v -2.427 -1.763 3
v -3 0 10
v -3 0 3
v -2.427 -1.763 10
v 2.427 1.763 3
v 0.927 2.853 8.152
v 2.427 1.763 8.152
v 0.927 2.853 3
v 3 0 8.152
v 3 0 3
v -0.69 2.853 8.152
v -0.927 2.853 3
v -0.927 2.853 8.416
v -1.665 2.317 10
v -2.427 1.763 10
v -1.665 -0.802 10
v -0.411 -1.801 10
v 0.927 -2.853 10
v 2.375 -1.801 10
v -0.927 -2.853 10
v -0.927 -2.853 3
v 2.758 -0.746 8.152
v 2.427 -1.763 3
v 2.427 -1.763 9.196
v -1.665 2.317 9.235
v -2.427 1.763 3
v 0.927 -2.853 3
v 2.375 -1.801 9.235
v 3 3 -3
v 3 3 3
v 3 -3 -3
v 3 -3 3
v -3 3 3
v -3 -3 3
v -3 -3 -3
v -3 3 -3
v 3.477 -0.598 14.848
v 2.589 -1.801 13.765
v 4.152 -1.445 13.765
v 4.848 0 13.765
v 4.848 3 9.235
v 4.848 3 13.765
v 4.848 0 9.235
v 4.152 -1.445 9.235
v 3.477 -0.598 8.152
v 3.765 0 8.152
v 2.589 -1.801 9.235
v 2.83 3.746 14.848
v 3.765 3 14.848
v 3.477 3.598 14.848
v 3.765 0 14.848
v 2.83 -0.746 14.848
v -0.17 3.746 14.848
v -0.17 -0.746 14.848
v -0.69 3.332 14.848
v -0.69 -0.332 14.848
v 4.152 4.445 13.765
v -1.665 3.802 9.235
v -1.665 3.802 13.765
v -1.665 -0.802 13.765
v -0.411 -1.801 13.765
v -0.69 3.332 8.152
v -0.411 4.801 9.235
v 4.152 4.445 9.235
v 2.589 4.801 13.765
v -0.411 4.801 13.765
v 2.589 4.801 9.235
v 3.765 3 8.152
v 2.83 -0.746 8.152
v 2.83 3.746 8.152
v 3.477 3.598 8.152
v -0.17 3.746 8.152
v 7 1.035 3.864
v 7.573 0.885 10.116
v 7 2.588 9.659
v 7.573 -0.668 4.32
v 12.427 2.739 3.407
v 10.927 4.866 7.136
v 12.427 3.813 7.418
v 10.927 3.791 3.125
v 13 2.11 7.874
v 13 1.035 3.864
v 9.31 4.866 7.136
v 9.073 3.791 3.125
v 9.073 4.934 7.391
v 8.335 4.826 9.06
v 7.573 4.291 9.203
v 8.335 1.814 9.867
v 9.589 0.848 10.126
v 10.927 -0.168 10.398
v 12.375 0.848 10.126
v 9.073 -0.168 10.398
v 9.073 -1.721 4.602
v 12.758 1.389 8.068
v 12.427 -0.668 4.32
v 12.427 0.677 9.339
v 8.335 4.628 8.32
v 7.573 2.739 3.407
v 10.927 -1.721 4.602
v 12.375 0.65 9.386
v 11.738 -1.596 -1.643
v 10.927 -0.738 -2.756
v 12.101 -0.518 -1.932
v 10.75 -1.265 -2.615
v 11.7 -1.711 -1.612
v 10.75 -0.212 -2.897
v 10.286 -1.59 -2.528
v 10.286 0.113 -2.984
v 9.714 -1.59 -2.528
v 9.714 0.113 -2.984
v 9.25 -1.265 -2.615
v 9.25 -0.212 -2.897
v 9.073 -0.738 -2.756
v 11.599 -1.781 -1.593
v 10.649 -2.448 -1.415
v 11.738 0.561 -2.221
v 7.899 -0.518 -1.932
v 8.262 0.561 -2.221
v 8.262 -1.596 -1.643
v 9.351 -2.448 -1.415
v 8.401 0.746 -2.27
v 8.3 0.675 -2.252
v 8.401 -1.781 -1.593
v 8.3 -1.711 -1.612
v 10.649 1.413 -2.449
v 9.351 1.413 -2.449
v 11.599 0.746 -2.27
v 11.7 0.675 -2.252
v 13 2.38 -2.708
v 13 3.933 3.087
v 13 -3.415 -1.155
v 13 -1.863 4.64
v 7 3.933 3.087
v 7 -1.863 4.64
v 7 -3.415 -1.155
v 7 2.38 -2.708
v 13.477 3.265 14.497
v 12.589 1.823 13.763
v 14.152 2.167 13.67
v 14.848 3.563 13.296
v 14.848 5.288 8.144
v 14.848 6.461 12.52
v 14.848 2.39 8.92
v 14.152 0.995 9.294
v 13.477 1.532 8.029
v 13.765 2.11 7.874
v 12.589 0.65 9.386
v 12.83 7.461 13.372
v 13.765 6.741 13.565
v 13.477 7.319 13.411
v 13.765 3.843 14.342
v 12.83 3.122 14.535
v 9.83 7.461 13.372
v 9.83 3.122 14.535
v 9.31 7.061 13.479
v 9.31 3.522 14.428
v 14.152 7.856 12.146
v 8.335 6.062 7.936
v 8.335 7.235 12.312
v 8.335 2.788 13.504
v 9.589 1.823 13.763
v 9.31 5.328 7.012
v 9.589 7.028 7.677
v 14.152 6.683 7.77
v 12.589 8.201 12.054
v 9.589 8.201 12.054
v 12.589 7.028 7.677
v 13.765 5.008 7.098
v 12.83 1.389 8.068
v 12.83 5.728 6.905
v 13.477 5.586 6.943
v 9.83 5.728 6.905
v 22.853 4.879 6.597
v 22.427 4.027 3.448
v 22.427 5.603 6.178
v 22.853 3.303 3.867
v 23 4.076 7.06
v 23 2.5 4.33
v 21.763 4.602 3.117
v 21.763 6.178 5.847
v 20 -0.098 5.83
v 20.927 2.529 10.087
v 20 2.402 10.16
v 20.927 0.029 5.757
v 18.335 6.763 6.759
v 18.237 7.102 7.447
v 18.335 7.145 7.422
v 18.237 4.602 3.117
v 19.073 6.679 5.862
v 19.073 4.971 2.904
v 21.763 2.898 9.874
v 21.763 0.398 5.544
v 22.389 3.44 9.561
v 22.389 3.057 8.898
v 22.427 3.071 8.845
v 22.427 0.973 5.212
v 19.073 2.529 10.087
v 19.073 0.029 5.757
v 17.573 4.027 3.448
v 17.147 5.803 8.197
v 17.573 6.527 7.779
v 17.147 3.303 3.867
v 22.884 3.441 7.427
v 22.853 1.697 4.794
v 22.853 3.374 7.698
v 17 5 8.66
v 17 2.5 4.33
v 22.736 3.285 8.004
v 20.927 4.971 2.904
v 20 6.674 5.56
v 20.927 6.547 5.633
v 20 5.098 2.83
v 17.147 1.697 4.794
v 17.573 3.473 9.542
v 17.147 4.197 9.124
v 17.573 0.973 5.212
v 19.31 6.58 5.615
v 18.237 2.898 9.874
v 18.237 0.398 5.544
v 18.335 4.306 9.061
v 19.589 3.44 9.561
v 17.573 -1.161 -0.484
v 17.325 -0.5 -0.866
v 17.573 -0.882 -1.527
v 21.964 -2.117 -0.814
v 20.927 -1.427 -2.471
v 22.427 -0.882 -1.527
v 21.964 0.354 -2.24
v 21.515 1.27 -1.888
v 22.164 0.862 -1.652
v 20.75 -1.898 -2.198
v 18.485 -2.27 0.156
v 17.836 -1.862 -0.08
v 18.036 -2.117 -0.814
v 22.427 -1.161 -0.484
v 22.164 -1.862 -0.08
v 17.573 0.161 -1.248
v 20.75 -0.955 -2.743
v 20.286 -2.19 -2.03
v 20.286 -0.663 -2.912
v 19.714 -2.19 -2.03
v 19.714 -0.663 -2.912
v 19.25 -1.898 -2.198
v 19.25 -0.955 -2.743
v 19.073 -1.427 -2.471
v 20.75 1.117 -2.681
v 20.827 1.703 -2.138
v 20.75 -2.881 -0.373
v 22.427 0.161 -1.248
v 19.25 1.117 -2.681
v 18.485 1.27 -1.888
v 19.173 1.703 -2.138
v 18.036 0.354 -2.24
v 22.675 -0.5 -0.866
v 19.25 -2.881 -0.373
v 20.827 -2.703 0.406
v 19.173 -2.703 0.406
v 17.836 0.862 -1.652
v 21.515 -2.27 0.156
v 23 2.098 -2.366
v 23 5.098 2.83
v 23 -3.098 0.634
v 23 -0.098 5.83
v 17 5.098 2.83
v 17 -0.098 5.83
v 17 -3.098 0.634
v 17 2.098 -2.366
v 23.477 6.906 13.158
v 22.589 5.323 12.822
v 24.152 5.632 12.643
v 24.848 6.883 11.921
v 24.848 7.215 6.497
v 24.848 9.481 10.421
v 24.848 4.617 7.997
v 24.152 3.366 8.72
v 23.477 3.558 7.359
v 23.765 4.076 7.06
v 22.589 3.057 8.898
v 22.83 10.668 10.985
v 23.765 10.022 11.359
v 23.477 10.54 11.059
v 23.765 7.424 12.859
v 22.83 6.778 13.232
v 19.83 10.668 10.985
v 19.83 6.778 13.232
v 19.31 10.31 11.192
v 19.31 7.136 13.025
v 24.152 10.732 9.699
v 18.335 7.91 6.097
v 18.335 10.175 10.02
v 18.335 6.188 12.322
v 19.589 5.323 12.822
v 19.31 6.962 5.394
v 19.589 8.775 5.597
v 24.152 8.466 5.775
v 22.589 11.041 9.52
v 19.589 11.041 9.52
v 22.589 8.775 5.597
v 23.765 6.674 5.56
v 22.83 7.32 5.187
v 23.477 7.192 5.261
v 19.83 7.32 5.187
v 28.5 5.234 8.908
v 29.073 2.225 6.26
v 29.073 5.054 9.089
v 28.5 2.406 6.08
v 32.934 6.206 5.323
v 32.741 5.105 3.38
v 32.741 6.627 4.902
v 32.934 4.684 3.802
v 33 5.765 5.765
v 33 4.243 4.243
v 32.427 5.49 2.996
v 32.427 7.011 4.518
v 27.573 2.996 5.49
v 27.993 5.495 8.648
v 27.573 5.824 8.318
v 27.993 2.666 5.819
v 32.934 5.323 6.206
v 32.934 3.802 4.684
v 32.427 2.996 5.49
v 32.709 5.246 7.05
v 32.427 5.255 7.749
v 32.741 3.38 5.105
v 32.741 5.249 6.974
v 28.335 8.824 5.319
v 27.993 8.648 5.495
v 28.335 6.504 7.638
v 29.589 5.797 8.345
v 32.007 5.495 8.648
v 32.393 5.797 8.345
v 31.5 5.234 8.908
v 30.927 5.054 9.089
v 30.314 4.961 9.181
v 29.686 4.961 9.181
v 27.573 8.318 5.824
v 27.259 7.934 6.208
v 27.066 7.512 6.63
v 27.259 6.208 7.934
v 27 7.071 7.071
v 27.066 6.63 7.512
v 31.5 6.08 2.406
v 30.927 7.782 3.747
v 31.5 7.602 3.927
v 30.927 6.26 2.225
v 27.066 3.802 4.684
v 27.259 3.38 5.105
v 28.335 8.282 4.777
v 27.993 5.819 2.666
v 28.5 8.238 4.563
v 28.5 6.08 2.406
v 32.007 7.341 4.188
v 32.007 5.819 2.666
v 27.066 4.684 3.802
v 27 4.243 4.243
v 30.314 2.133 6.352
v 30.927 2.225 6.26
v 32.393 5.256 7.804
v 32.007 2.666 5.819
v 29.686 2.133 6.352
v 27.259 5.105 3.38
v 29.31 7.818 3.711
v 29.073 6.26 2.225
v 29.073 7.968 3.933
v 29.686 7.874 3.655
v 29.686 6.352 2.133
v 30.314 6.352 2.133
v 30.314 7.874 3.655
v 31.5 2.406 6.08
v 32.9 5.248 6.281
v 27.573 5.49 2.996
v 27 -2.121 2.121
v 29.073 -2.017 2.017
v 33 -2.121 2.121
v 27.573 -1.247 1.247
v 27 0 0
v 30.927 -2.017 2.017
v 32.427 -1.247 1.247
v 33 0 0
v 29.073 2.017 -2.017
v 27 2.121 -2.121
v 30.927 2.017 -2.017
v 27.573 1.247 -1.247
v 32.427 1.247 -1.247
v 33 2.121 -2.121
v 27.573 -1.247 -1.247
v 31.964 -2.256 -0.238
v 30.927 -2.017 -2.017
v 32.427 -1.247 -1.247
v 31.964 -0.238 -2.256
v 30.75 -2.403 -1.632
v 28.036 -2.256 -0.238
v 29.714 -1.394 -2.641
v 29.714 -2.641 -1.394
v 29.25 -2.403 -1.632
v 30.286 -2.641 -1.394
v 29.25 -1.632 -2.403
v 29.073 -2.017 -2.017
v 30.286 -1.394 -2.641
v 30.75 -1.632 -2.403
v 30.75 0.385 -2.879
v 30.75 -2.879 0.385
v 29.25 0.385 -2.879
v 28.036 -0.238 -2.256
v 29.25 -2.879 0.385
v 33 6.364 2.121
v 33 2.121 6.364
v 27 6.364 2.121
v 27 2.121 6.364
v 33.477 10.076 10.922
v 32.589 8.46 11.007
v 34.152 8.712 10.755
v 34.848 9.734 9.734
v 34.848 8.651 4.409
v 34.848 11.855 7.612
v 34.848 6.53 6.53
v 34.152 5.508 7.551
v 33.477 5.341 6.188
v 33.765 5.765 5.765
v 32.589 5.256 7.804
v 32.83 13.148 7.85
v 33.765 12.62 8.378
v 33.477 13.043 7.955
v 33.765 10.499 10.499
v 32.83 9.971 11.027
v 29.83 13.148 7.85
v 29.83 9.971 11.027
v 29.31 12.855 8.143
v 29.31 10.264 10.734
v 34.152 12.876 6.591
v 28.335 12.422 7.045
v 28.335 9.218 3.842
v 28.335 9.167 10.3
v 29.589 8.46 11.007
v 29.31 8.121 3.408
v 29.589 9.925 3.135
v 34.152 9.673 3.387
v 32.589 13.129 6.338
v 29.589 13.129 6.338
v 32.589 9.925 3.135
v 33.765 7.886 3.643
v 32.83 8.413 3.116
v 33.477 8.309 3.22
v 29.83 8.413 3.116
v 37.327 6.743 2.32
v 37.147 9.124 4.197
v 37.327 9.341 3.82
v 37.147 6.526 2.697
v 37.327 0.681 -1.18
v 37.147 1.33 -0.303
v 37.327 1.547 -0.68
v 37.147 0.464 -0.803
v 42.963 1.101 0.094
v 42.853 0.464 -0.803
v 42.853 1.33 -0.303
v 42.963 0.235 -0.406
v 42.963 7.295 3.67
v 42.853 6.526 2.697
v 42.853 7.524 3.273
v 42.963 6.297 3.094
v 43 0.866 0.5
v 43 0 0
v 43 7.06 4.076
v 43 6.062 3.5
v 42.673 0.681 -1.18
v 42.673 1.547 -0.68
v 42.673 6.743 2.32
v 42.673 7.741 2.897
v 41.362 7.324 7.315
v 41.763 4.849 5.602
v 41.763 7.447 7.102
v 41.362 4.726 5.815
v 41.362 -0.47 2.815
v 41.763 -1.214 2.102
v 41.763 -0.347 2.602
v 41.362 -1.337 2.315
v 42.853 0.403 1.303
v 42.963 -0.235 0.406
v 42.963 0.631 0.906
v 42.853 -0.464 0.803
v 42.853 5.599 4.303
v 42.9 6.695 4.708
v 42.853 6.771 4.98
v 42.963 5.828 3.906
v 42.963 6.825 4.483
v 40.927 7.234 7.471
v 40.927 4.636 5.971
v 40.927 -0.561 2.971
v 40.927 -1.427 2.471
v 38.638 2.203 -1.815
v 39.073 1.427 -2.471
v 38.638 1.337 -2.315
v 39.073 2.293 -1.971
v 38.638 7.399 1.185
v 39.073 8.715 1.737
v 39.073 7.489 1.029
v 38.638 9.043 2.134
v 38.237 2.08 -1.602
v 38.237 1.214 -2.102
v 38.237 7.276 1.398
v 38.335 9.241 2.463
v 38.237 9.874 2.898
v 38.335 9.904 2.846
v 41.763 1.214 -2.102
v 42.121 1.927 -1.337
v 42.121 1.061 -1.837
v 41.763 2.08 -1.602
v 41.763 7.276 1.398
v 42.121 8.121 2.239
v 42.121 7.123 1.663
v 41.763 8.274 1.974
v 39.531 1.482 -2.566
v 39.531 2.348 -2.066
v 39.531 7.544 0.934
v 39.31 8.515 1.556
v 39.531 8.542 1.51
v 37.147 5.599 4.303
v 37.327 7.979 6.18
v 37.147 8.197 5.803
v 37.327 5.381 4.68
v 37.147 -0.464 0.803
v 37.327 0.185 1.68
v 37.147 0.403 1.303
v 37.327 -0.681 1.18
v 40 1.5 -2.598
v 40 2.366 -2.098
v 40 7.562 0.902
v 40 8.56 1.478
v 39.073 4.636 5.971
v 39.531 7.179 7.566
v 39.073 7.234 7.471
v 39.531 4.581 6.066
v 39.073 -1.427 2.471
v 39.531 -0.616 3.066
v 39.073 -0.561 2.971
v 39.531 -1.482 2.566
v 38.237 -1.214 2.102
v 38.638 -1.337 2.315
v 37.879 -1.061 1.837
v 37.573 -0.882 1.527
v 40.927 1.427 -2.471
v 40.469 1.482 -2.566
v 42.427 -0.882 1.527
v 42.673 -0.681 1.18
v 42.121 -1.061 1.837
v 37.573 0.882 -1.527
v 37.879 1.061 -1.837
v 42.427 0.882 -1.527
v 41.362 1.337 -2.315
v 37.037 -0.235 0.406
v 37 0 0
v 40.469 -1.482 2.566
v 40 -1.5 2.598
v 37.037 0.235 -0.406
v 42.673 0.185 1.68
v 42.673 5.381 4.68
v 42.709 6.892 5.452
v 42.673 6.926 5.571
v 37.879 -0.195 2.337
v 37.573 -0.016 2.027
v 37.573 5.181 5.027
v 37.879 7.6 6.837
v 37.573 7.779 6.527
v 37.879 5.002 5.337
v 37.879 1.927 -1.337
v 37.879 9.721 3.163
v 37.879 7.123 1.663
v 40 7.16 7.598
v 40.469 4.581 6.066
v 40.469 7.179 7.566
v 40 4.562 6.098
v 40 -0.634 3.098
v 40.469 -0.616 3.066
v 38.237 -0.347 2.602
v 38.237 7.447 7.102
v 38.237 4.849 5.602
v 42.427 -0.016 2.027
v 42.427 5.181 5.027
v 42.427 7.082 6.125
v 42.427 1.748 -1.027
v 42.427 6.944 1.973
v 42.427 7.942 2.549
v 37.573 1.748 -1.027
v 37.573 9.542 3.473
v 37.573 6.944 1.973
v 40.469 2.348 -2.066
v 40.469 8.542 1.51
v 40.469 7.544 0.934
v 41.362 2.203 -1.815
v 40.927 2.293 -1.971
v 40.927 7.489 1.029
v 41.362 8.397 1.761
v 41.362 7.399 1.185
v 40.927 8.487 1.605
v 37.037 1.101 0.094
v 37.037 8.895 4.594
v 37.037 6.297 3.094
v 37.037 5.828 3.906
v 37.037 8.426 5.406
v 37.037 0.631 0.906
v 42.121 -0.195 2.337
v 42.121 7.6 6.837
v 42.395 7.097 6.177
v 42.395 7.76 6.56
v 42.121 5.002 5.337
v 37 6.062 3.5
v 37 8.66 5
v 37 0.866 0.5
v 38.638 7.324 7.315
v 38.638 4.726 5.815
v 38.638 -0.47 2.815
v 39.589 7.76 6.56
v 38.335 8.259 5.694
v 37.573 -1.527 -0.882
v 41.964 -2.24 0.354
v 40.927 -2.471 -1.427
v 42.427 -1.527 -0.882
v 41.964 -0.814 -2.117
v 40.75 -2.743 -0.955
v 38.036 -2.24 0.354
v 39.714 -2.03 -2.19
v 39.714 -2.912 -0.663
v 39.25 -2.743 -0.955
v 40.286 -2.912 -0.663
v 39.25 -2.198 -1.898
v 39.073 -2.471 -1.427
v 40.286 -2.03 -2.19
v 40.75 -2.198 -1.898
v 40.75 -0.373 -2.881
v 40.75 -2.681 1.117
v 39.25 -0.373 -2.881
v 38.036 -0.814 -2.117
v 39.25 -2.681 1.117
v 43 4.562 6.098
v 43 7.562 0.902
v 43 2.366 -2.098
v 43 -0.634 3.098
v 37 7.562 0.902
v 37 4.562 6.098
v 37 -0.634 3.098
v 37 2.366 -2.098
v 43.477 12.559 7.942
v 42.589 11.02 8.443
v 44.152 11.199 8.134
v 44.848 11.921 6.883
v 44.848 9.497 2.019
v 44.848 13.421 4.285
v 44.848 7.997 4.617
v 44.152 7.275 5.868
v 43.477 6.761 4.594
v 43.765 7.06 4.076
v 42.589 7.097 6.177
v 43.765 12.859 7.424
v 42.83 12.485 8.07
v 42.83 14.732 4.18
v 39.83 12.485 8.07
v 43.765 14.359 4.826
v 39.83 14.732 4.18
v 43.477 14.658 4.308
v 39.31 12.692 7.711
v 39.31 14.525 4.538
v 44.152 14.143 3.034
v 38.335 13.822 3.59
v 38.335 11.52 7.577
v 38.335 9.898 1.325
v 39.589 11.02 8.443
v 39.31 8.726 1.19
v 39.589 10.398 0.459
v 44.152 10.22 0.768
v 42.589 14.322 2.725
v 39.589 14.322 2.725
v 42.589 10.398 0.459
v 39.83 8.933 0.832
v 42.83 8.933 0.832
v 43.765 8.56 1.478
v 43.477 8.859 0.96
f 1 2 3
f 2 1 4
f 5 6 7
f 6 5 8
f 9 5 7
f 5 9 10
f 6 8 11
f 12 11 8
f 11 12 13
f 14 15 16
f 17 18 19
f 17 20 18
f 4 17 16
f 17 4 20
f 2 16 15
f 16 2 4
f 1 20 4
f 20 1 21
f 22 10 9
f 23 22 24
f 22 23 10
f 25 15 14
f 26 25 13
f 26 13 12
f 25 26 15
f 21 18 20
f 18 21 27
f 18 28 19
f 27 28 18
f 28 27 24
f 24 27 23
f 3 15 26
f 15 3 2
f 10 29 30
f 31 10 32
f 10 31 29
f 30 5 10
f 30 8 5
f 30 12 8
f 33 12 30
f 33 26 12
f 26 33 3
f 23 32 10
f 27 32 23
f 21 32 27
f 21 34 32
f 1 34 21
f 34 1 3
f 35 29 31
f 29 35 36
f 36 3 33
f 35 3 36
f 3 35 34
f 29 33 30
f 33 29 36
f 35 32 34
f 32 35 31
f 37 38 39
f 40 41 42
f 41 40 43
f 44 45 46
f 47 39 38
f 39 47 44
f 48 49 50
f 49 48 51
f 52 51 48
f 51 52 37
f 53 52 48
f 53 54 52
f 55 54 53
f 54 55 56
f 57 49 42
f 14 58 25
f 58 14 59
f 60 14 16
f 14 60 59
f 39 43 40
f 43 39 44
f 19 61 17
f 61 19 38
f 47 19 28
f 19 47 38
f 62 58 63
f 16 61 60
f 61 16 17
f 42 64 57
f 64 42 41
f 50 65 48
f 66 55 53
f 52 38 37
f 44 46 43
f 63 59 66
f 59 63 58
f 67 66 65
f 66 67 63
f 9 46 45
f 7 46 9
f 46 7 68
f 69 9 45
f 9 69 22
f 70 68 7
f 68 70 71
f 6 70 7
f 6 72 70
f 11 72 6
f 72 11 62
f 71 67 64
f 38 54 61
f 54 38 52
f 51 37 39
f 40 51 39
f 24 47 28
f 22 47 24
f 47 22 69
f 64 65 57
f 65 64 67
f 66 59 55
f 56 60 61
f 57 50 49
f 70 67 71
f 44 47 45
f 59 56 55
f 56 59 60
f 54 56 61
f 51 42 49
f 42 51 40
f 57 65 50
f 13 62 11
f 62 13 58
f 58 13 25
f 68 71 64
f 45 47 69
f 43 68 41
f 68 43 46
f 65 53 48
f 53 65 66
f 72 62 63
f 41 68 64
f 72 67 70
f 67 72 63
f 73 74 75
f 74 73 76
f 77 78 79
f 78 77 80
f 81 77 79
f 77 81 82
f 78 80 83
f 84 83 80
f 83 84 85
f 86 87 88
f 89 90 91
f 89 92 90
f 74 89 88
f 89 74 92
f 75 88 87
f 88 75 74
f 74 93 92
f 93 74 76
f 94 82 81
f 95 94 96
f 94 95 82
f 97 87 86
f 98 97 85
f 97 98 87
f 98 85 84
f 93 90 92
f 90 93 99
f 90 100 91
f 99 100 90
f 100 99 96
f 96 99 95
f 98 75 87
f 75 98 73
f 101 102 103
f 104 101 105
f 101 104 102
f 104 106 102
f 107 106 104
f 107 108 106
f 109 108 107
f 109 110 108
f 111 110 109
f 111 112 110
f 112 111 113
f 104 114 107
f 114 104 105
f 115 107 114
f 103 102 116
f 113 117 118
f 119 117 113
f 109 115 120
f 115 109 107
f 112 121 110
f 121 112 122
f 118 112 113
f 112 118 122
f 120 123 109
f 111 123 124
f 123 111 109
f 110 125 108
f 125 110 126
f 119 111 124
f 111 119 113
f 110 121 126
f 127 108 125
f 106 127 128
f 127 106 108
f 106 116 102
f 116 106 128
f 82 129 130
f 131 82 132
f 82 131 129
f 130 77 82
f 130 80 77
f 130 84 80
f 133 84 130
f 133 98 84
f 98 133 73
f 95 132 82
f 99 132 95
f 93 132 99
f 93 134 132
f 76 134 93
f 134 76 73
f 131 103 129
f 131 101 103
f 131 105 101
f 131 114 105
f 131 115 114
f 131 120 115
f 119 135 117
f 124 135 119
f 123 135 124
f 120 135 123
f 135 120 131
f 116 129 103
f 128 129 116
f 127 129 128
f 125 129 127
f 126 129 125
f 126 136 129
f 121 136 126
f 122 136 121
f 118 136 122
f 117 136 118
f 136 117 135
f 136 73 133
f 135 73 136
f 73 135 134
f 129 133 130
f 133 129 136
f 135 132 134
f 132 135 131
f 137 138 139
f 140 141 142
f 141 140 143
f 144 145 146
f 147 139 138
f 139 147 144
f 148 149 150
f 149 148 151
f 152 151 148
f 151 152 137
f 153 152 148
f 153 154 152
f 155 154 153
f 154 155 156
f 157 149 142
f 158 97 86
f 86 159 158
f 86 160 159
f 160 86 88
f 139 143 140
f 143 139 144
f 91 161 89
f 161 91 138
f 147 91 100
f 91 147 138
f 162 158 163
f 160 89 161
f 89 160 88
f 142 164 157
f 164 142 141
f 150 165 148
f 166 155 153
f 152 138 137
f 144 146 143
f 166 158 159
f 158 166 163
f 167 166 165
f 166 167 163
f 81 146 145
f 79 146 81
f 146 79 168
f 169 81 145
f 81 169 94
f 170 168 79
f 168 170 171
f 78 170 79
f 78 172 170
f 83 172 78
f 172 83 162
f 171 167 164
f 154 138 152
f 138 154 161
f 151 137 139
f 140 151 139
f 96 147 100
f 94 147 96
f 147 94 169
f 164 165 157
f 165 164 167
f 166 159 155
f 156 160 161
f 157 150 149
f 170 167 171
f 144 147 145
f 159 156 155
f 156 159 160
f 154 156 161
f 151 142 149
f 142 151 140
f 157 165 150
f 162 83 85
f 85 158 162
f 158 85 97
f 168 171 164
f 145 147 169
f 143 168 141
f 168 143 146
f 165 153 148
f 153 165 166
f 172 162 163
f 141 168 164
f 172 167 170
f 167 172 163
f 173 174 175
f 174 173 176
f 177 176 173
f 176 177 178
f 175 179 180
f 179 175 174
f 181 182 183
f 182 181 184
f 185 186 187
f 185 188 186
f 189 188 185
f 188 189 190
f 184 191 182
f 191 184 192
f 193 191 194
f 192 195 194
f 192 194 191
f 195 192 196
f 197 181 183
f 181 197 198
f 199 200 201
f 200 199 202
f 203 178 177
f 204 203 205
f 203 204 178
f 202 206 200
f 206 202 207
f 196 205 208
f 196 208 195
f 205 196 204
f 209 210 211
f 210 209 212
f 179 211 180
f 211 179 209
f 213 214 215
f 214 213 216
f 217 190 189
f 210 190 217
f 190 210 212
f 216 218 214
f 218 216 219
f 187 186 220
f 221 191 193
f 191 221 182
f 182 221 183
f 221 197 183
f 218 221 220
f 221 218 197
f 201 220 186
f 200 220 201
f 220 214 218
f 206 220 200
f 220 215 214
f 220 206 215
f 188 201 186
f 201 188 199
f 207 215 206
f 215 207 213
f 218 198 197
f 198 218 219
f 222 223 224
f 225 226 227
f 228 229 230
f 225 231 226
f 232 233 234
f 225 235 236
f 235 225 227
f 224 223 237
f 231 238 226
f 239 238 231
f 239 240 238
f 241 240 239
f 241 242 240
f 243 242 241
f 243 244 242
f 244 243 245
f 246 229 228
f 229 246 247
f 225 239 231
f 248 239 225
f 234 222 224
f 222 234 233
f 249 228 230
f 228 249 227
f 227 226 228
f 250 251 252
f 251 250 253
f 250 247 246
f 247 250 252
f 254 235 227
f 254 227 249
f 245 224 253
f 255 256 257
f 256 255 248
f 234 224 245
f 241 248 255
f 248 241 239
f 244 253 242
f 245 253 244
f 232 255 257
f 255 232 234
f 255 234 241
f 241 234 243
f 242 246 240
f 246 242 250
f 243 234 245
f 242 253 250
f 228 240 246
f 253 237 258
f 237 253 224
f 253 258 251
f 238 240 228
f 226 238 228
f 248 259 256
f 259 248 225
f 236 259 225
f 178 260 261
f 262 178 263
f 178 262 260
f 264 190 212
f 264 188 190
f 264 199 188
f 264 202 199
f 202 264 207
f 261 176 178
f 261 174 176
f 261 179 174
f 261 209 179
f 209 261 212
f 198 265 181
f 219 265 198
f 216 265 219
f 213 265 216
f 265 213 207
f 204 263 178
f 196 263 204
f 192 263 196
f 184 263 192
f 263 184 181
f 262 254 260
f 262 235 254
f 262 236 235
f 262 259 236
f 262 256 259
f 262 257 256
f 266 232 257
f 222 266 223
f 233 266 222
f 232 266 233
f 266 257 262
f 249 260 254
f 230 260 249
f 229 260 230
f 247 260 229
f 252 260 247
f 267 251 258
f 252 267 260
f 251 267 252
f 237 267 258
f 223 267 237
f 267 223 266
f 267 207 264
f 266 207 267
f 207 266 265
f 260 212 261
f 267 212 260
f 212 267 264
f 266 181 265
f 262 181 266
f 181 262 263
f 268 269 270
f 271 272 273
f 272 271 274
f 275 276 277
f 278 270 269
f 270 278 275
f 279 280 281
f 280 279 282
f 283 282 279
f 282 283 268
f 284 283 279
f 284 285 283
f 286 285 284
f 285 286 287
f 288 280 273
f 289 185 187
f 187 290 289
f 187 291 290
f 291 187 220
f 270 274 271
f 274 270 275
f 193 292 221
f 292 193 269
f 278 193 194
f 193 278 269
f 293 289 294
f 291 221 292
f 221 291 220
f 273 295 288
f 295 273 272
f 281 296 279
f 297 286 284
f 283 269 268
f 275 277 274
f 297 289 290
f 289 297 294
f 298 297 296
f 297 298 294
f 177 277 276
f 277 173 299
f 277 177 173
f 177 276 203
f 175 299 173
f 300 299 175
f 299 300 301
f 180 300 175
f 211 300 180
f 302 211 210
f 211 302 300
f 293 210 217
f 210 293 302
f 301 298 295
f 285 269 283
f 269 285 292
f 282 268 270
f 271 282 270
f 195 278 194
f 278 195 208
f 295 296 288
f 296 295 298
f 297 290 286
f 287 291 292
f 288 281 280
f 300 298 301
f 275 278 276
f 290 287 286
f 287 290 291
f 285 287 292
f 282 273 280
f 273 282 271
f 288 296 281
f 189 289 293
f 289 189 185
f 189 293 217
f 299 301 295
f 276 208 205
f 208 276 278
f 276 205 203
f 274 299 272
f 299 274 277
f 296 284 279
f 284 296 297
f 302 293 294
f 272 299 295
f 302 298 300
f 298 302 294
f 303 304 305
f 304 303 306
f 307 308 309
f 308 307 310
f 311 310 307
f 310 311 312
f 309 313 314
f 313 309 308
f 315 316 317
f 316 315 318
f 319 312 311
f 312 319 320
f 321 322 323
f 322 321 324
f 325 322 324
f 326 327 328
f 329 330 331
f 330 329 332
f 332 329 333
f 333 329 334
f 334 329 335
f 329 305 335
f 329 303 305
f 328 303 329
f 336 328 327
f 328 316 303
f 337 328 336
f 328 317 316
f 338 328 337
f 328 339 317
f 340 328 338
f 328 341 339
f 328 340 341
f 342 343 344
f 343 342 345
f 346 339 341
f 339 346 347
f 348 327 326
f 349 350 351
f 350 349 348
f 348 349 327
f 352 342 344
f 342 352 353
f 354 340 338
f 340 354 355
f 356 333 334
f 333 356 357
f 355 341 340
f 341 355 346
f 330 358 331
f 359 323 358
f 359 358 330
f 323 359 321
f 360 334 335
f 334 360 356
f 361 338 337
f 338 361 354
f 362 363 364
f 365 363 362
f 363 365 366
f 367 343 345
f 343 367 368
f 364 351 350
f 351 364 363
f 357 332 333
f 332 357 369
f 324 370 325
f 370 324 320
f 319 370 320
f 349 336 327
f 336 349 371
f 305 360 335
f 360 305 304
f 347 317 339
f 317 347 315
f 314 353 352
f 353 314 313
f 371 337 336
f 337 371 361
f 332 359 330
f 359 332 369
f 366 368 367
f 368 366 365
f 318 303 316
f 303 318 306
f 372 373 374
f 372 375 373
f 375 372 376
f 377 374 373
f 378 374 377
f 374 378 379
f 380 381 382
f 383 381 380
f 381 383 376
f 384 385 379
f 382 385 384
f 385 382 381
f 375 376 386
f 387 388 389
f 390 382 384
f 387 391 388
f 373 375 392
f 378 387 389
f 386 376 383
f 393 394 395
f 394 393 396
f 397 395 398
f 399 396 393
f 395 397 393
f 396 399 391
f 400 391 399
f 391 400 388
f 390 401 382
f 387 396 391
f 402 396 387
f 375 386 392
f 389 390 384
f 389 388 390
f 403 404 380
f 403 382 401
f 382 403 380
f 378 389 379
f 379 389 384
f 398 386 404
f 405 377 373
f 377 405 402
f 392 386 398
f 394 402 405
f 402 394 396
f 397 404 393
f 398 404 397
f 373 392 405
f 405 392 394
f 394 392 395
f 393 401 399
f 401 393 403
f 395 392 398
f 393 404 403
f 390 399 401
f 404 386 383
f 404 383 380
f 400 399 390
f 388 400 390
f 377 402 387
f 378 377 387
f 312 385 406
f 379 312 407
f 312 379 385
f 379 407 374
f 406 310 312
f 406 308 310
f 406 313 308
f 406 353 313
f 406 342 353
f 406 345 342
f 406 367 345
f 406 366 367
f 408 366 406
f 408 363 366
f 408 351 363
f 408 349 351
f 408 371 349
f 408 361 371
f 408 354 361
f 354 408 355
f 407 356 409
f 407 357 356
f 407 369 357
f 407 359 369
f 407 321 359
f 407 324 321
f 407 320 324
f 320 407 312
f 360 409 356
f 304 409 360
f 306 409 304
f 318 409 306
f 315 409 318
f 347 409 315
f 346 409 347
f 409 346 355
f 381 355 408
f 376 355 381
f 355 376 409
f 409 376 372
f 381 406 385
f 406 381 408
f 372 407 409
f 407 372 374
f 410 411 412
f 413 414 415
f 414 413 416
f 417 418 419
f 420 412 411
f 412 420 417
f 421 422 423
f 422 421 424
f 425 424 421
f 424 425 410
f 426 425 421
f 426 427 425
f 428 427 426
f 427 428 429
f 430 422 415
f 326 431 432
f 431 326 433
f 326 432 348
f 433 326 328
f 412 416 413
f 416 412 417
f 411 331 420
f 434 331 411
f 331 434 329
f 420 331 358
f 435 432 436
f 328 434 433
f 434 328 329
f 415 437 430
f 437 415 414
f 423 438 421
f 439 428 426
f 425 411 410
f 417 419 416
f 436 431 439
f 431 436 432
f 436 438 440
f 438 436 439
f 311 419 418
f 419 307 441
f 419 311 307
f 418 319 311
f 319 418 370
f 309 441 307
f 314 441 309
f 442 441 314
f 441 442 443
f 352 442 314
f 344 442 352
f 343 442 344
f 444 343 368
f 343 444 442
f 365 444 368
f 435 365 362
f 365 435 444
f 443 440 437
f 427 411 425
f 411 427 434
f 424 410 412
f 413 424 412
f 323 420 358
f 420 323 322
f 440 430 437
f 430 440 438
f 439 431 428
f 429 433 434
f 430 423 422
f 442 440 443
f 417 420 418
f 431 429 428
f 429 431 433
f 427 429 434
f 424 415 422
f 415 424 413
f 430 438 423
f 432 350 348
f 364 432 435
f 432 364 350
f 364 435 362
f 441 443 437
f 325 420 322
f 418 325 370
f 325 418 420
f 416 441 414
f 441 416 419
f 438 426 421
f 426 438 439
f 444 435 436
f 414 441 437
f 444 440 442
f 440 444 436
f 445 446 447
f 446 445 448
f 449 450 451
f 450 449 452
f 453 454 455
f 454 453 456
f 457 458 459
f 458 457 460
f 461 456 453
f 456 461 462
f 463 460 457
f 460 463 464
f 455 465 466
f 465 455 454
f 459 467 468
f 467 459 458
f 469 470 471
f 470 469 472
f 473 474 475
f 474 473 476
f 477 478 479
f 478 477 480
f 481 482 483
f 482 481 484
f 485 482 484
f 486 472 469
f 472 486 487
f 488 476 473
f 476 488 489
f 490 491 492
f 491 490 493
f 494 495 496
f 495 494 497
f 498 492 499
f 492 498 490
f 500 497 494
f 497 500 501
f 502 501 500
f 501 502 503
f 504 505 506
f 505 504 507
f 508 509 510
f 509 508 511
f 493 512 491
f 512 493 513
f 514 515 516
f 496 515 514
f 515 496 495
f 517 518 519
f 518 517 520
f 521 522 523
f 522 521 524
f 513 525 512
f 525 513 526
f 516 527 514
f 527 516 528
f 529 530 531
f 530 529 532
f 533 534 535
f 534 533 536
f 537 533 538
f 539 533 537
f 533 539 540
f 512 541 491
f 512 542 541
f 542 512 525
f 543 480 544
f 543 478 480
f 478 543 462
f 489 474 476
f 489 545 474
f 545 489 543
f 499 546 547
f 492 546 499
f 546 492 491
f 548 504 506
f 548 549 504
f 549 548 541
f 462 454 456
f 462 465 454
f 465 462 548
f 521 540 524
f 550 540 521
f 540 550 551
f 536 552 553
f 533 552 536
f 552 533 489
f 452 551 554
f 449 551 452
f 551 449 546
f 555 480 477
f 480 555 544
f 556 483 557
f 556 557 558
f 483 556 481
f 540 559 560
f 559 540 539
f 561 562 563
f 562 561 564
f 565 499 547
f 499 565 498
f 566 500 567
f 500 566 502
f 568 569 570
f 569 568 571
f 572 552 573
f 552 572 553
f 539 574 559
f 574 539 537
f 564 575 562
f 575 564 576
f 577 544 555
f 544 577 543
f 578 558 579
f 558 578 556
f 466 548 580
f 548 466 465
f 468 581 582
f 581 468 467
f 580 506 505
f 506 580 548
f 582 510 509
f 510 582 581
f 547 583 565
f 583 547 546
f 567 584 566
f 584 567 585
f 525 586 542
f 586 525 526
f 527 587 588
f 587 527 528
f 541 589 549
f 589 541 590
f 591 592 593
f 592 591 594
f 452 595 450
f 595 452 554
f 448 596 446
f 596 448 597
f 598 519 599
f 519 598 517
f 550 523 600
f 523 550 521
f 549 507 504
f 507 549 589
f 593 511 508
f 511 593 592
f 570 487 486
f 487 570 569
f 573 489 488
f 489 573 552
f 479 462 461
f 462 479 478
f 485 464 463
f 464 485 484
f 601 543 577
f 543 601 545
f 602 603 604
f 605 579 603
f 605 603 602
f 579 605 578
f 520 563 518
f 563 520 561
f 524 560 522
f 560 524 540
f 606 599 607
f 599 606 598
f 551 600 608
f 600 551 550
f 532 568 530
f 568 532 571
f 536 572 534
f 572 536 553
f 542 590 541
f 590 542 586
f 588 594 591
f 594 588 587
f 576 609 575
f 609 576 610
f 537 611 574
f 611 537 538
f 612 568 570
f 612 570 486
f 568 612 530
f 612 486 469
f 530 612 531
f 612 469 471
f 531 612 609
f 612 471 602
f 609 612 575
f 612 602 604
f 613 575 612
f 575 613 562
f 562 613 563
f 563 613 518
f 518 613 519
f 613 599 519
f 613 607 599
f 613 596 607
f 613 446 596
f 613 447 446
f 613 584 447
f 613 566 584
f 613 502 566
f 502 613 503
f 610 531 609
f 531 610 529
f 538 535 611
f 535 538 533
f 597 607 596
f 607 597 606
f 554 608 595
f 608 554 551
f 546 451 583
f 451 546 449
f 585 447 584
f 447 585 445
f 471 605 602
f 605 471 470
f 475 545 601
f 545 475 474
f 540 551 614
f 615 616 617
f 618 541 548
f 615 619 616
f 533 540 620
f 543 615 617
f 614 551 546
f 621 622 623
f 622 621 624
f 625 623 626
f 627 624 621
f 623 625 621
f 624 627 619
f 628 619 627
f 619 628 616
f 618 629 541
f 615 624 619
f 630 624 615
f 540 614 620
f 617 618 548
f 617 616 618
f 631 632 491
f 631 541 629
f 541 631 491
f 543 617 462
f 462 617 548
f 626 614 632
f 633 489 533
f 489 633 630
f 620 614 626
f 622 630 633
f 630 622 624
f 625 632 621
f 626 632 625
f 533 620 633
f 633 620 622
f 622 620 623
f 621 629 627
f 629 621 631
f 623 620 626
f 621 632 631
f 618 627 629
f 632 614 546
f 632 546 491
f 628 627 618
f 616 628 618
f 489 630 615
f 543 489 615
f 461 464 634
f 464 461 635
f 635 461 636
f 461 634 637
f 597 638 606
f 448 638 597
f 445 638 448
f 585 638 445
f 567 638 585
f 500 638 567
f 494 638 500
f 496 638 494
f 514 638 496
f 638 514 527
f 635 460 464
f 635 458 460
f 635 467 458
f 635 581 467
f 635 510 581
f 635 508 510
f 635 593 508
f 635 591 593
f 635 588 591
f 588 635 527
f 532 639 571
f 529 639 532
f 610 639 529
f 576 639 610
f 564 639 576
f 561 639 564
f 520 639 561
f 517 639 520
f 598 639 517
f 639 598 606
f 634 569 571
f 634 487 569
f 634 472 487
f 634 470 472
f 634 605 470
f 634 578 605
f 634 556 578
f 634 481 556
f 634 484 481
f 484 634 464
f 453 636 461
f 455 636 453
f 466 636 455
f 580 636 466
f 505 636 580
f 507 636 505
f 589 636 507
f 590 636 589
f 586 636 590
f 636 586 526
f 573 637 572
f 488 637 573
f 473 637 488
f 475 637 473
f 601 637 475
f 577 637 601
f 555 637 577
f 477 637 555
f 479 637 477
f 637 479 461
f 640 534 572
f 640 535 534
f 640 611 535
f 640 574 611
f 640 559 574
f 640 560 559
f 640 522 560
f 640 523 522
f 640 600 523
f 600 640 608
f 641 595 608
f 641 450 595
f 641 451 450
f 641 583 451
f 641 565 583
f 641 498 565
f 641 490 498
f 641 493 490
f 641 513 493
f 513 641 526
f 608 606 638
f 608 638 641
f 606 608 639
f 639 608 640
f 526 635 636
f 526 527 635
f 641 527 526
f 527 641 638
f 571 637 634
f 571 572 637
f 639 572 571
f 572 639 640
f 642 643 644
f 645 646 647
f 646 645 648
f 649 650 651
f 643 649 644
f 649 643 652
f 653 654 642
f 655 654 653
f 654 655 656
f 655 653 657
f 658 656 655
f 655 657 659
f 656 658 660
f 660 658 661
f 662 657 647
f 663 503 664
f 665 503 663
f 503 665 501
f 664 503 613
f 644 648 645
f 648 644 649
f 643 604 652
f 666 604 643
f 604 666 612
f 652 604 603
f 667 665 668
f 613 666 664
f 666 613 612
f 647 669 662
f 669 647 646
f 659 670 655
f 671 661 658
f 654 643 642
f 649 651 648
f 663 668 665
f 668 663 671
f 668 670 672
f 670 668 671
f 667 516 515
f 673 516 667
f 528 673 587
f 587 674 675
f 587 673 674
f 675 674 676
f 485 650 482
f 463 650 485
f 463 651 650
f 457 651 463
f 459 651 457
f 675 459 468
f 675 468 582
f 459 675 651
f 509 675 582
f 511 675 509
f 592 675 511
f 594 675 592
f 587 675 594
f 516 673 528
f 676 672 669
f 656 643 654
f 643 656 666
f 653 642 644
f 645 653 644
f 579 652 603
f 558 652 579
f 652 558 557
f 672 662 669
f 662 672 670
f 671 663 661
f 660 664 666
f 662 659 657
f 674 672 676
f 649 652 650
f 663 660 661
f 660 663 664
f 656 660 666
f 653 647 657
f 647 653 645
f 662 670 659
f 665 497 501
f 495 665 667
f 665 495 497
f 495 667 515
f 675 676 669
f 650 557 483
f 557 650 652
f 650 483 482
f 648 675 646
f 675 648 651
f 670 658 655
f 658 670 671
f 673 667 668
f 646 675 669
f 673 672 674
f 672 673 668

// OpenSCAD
union(){
  translate([0, 0, 0]){
    rotate([0, 0, 0]){
      cylinder(r=3, h=10, $fn=0);
      union(){
        sphere(3);
      };
      translate([0, 0, 0]){
        cube(6, true);
      };
      translate([0, 0, 10]){
        union(){
          minkowski(){
            cube(3);
            sphere(r=2);
          };
        };
      };
    };
  };
  translate([10, 0, 0]){
    rotate([-15, 0, 0]){
      cylinder(r=3, h=10, $fn=10);
      union(){
        sphere(3);
      };
      translate([0, 0, 1]){
        cube(6, true);
      };
      translate([0, 0, 10]){
        union(){
          minkowski(){
            cube(3);
            sphere(r=2);
          };
        };
      };
    };
  };
  translate([20, 0, 0]){
    rotate([-30, 0, 0]){
      cylinder(r=3, h=10, $fn=20);
      union(){
        sphere(3);
      };
      translate([0, 0, 2]){
        cube(6, true);
      };
      translate([0, 0, 10]){
        union(){
          minkowski(){
            cube(3);
            sphere(r=2);
          };
        };
      };
    };
  };
  translate([30, 0, 0]){
    rotate([-45, 0, 0]){
      cylinder(r=3, h=10, $fn=30);
      union(){
        sphere(3);
      };
      translate([0, 0, 3]){
        cube(6, true);
      };
      translate([0, 0, 10]){
        union(){
          minkowski(){
            cube(3);
            sphere(r=2);
          };
        };
      };
    };
  };
  translate([40, 0, 0]){
    rotate([-60, 0, 0]){
      cylinder(r=3, h=10, $fn=40);
      union(){
        sphere(3);
      };
      translate([0, 0, 4]){
        cube(6, true);
      };
      translate([0, 0, 10]){
        union(){
          minkowski(){
            cube(3);
            sphere(r=2);
          };
        };
      };
    };
  };
};
